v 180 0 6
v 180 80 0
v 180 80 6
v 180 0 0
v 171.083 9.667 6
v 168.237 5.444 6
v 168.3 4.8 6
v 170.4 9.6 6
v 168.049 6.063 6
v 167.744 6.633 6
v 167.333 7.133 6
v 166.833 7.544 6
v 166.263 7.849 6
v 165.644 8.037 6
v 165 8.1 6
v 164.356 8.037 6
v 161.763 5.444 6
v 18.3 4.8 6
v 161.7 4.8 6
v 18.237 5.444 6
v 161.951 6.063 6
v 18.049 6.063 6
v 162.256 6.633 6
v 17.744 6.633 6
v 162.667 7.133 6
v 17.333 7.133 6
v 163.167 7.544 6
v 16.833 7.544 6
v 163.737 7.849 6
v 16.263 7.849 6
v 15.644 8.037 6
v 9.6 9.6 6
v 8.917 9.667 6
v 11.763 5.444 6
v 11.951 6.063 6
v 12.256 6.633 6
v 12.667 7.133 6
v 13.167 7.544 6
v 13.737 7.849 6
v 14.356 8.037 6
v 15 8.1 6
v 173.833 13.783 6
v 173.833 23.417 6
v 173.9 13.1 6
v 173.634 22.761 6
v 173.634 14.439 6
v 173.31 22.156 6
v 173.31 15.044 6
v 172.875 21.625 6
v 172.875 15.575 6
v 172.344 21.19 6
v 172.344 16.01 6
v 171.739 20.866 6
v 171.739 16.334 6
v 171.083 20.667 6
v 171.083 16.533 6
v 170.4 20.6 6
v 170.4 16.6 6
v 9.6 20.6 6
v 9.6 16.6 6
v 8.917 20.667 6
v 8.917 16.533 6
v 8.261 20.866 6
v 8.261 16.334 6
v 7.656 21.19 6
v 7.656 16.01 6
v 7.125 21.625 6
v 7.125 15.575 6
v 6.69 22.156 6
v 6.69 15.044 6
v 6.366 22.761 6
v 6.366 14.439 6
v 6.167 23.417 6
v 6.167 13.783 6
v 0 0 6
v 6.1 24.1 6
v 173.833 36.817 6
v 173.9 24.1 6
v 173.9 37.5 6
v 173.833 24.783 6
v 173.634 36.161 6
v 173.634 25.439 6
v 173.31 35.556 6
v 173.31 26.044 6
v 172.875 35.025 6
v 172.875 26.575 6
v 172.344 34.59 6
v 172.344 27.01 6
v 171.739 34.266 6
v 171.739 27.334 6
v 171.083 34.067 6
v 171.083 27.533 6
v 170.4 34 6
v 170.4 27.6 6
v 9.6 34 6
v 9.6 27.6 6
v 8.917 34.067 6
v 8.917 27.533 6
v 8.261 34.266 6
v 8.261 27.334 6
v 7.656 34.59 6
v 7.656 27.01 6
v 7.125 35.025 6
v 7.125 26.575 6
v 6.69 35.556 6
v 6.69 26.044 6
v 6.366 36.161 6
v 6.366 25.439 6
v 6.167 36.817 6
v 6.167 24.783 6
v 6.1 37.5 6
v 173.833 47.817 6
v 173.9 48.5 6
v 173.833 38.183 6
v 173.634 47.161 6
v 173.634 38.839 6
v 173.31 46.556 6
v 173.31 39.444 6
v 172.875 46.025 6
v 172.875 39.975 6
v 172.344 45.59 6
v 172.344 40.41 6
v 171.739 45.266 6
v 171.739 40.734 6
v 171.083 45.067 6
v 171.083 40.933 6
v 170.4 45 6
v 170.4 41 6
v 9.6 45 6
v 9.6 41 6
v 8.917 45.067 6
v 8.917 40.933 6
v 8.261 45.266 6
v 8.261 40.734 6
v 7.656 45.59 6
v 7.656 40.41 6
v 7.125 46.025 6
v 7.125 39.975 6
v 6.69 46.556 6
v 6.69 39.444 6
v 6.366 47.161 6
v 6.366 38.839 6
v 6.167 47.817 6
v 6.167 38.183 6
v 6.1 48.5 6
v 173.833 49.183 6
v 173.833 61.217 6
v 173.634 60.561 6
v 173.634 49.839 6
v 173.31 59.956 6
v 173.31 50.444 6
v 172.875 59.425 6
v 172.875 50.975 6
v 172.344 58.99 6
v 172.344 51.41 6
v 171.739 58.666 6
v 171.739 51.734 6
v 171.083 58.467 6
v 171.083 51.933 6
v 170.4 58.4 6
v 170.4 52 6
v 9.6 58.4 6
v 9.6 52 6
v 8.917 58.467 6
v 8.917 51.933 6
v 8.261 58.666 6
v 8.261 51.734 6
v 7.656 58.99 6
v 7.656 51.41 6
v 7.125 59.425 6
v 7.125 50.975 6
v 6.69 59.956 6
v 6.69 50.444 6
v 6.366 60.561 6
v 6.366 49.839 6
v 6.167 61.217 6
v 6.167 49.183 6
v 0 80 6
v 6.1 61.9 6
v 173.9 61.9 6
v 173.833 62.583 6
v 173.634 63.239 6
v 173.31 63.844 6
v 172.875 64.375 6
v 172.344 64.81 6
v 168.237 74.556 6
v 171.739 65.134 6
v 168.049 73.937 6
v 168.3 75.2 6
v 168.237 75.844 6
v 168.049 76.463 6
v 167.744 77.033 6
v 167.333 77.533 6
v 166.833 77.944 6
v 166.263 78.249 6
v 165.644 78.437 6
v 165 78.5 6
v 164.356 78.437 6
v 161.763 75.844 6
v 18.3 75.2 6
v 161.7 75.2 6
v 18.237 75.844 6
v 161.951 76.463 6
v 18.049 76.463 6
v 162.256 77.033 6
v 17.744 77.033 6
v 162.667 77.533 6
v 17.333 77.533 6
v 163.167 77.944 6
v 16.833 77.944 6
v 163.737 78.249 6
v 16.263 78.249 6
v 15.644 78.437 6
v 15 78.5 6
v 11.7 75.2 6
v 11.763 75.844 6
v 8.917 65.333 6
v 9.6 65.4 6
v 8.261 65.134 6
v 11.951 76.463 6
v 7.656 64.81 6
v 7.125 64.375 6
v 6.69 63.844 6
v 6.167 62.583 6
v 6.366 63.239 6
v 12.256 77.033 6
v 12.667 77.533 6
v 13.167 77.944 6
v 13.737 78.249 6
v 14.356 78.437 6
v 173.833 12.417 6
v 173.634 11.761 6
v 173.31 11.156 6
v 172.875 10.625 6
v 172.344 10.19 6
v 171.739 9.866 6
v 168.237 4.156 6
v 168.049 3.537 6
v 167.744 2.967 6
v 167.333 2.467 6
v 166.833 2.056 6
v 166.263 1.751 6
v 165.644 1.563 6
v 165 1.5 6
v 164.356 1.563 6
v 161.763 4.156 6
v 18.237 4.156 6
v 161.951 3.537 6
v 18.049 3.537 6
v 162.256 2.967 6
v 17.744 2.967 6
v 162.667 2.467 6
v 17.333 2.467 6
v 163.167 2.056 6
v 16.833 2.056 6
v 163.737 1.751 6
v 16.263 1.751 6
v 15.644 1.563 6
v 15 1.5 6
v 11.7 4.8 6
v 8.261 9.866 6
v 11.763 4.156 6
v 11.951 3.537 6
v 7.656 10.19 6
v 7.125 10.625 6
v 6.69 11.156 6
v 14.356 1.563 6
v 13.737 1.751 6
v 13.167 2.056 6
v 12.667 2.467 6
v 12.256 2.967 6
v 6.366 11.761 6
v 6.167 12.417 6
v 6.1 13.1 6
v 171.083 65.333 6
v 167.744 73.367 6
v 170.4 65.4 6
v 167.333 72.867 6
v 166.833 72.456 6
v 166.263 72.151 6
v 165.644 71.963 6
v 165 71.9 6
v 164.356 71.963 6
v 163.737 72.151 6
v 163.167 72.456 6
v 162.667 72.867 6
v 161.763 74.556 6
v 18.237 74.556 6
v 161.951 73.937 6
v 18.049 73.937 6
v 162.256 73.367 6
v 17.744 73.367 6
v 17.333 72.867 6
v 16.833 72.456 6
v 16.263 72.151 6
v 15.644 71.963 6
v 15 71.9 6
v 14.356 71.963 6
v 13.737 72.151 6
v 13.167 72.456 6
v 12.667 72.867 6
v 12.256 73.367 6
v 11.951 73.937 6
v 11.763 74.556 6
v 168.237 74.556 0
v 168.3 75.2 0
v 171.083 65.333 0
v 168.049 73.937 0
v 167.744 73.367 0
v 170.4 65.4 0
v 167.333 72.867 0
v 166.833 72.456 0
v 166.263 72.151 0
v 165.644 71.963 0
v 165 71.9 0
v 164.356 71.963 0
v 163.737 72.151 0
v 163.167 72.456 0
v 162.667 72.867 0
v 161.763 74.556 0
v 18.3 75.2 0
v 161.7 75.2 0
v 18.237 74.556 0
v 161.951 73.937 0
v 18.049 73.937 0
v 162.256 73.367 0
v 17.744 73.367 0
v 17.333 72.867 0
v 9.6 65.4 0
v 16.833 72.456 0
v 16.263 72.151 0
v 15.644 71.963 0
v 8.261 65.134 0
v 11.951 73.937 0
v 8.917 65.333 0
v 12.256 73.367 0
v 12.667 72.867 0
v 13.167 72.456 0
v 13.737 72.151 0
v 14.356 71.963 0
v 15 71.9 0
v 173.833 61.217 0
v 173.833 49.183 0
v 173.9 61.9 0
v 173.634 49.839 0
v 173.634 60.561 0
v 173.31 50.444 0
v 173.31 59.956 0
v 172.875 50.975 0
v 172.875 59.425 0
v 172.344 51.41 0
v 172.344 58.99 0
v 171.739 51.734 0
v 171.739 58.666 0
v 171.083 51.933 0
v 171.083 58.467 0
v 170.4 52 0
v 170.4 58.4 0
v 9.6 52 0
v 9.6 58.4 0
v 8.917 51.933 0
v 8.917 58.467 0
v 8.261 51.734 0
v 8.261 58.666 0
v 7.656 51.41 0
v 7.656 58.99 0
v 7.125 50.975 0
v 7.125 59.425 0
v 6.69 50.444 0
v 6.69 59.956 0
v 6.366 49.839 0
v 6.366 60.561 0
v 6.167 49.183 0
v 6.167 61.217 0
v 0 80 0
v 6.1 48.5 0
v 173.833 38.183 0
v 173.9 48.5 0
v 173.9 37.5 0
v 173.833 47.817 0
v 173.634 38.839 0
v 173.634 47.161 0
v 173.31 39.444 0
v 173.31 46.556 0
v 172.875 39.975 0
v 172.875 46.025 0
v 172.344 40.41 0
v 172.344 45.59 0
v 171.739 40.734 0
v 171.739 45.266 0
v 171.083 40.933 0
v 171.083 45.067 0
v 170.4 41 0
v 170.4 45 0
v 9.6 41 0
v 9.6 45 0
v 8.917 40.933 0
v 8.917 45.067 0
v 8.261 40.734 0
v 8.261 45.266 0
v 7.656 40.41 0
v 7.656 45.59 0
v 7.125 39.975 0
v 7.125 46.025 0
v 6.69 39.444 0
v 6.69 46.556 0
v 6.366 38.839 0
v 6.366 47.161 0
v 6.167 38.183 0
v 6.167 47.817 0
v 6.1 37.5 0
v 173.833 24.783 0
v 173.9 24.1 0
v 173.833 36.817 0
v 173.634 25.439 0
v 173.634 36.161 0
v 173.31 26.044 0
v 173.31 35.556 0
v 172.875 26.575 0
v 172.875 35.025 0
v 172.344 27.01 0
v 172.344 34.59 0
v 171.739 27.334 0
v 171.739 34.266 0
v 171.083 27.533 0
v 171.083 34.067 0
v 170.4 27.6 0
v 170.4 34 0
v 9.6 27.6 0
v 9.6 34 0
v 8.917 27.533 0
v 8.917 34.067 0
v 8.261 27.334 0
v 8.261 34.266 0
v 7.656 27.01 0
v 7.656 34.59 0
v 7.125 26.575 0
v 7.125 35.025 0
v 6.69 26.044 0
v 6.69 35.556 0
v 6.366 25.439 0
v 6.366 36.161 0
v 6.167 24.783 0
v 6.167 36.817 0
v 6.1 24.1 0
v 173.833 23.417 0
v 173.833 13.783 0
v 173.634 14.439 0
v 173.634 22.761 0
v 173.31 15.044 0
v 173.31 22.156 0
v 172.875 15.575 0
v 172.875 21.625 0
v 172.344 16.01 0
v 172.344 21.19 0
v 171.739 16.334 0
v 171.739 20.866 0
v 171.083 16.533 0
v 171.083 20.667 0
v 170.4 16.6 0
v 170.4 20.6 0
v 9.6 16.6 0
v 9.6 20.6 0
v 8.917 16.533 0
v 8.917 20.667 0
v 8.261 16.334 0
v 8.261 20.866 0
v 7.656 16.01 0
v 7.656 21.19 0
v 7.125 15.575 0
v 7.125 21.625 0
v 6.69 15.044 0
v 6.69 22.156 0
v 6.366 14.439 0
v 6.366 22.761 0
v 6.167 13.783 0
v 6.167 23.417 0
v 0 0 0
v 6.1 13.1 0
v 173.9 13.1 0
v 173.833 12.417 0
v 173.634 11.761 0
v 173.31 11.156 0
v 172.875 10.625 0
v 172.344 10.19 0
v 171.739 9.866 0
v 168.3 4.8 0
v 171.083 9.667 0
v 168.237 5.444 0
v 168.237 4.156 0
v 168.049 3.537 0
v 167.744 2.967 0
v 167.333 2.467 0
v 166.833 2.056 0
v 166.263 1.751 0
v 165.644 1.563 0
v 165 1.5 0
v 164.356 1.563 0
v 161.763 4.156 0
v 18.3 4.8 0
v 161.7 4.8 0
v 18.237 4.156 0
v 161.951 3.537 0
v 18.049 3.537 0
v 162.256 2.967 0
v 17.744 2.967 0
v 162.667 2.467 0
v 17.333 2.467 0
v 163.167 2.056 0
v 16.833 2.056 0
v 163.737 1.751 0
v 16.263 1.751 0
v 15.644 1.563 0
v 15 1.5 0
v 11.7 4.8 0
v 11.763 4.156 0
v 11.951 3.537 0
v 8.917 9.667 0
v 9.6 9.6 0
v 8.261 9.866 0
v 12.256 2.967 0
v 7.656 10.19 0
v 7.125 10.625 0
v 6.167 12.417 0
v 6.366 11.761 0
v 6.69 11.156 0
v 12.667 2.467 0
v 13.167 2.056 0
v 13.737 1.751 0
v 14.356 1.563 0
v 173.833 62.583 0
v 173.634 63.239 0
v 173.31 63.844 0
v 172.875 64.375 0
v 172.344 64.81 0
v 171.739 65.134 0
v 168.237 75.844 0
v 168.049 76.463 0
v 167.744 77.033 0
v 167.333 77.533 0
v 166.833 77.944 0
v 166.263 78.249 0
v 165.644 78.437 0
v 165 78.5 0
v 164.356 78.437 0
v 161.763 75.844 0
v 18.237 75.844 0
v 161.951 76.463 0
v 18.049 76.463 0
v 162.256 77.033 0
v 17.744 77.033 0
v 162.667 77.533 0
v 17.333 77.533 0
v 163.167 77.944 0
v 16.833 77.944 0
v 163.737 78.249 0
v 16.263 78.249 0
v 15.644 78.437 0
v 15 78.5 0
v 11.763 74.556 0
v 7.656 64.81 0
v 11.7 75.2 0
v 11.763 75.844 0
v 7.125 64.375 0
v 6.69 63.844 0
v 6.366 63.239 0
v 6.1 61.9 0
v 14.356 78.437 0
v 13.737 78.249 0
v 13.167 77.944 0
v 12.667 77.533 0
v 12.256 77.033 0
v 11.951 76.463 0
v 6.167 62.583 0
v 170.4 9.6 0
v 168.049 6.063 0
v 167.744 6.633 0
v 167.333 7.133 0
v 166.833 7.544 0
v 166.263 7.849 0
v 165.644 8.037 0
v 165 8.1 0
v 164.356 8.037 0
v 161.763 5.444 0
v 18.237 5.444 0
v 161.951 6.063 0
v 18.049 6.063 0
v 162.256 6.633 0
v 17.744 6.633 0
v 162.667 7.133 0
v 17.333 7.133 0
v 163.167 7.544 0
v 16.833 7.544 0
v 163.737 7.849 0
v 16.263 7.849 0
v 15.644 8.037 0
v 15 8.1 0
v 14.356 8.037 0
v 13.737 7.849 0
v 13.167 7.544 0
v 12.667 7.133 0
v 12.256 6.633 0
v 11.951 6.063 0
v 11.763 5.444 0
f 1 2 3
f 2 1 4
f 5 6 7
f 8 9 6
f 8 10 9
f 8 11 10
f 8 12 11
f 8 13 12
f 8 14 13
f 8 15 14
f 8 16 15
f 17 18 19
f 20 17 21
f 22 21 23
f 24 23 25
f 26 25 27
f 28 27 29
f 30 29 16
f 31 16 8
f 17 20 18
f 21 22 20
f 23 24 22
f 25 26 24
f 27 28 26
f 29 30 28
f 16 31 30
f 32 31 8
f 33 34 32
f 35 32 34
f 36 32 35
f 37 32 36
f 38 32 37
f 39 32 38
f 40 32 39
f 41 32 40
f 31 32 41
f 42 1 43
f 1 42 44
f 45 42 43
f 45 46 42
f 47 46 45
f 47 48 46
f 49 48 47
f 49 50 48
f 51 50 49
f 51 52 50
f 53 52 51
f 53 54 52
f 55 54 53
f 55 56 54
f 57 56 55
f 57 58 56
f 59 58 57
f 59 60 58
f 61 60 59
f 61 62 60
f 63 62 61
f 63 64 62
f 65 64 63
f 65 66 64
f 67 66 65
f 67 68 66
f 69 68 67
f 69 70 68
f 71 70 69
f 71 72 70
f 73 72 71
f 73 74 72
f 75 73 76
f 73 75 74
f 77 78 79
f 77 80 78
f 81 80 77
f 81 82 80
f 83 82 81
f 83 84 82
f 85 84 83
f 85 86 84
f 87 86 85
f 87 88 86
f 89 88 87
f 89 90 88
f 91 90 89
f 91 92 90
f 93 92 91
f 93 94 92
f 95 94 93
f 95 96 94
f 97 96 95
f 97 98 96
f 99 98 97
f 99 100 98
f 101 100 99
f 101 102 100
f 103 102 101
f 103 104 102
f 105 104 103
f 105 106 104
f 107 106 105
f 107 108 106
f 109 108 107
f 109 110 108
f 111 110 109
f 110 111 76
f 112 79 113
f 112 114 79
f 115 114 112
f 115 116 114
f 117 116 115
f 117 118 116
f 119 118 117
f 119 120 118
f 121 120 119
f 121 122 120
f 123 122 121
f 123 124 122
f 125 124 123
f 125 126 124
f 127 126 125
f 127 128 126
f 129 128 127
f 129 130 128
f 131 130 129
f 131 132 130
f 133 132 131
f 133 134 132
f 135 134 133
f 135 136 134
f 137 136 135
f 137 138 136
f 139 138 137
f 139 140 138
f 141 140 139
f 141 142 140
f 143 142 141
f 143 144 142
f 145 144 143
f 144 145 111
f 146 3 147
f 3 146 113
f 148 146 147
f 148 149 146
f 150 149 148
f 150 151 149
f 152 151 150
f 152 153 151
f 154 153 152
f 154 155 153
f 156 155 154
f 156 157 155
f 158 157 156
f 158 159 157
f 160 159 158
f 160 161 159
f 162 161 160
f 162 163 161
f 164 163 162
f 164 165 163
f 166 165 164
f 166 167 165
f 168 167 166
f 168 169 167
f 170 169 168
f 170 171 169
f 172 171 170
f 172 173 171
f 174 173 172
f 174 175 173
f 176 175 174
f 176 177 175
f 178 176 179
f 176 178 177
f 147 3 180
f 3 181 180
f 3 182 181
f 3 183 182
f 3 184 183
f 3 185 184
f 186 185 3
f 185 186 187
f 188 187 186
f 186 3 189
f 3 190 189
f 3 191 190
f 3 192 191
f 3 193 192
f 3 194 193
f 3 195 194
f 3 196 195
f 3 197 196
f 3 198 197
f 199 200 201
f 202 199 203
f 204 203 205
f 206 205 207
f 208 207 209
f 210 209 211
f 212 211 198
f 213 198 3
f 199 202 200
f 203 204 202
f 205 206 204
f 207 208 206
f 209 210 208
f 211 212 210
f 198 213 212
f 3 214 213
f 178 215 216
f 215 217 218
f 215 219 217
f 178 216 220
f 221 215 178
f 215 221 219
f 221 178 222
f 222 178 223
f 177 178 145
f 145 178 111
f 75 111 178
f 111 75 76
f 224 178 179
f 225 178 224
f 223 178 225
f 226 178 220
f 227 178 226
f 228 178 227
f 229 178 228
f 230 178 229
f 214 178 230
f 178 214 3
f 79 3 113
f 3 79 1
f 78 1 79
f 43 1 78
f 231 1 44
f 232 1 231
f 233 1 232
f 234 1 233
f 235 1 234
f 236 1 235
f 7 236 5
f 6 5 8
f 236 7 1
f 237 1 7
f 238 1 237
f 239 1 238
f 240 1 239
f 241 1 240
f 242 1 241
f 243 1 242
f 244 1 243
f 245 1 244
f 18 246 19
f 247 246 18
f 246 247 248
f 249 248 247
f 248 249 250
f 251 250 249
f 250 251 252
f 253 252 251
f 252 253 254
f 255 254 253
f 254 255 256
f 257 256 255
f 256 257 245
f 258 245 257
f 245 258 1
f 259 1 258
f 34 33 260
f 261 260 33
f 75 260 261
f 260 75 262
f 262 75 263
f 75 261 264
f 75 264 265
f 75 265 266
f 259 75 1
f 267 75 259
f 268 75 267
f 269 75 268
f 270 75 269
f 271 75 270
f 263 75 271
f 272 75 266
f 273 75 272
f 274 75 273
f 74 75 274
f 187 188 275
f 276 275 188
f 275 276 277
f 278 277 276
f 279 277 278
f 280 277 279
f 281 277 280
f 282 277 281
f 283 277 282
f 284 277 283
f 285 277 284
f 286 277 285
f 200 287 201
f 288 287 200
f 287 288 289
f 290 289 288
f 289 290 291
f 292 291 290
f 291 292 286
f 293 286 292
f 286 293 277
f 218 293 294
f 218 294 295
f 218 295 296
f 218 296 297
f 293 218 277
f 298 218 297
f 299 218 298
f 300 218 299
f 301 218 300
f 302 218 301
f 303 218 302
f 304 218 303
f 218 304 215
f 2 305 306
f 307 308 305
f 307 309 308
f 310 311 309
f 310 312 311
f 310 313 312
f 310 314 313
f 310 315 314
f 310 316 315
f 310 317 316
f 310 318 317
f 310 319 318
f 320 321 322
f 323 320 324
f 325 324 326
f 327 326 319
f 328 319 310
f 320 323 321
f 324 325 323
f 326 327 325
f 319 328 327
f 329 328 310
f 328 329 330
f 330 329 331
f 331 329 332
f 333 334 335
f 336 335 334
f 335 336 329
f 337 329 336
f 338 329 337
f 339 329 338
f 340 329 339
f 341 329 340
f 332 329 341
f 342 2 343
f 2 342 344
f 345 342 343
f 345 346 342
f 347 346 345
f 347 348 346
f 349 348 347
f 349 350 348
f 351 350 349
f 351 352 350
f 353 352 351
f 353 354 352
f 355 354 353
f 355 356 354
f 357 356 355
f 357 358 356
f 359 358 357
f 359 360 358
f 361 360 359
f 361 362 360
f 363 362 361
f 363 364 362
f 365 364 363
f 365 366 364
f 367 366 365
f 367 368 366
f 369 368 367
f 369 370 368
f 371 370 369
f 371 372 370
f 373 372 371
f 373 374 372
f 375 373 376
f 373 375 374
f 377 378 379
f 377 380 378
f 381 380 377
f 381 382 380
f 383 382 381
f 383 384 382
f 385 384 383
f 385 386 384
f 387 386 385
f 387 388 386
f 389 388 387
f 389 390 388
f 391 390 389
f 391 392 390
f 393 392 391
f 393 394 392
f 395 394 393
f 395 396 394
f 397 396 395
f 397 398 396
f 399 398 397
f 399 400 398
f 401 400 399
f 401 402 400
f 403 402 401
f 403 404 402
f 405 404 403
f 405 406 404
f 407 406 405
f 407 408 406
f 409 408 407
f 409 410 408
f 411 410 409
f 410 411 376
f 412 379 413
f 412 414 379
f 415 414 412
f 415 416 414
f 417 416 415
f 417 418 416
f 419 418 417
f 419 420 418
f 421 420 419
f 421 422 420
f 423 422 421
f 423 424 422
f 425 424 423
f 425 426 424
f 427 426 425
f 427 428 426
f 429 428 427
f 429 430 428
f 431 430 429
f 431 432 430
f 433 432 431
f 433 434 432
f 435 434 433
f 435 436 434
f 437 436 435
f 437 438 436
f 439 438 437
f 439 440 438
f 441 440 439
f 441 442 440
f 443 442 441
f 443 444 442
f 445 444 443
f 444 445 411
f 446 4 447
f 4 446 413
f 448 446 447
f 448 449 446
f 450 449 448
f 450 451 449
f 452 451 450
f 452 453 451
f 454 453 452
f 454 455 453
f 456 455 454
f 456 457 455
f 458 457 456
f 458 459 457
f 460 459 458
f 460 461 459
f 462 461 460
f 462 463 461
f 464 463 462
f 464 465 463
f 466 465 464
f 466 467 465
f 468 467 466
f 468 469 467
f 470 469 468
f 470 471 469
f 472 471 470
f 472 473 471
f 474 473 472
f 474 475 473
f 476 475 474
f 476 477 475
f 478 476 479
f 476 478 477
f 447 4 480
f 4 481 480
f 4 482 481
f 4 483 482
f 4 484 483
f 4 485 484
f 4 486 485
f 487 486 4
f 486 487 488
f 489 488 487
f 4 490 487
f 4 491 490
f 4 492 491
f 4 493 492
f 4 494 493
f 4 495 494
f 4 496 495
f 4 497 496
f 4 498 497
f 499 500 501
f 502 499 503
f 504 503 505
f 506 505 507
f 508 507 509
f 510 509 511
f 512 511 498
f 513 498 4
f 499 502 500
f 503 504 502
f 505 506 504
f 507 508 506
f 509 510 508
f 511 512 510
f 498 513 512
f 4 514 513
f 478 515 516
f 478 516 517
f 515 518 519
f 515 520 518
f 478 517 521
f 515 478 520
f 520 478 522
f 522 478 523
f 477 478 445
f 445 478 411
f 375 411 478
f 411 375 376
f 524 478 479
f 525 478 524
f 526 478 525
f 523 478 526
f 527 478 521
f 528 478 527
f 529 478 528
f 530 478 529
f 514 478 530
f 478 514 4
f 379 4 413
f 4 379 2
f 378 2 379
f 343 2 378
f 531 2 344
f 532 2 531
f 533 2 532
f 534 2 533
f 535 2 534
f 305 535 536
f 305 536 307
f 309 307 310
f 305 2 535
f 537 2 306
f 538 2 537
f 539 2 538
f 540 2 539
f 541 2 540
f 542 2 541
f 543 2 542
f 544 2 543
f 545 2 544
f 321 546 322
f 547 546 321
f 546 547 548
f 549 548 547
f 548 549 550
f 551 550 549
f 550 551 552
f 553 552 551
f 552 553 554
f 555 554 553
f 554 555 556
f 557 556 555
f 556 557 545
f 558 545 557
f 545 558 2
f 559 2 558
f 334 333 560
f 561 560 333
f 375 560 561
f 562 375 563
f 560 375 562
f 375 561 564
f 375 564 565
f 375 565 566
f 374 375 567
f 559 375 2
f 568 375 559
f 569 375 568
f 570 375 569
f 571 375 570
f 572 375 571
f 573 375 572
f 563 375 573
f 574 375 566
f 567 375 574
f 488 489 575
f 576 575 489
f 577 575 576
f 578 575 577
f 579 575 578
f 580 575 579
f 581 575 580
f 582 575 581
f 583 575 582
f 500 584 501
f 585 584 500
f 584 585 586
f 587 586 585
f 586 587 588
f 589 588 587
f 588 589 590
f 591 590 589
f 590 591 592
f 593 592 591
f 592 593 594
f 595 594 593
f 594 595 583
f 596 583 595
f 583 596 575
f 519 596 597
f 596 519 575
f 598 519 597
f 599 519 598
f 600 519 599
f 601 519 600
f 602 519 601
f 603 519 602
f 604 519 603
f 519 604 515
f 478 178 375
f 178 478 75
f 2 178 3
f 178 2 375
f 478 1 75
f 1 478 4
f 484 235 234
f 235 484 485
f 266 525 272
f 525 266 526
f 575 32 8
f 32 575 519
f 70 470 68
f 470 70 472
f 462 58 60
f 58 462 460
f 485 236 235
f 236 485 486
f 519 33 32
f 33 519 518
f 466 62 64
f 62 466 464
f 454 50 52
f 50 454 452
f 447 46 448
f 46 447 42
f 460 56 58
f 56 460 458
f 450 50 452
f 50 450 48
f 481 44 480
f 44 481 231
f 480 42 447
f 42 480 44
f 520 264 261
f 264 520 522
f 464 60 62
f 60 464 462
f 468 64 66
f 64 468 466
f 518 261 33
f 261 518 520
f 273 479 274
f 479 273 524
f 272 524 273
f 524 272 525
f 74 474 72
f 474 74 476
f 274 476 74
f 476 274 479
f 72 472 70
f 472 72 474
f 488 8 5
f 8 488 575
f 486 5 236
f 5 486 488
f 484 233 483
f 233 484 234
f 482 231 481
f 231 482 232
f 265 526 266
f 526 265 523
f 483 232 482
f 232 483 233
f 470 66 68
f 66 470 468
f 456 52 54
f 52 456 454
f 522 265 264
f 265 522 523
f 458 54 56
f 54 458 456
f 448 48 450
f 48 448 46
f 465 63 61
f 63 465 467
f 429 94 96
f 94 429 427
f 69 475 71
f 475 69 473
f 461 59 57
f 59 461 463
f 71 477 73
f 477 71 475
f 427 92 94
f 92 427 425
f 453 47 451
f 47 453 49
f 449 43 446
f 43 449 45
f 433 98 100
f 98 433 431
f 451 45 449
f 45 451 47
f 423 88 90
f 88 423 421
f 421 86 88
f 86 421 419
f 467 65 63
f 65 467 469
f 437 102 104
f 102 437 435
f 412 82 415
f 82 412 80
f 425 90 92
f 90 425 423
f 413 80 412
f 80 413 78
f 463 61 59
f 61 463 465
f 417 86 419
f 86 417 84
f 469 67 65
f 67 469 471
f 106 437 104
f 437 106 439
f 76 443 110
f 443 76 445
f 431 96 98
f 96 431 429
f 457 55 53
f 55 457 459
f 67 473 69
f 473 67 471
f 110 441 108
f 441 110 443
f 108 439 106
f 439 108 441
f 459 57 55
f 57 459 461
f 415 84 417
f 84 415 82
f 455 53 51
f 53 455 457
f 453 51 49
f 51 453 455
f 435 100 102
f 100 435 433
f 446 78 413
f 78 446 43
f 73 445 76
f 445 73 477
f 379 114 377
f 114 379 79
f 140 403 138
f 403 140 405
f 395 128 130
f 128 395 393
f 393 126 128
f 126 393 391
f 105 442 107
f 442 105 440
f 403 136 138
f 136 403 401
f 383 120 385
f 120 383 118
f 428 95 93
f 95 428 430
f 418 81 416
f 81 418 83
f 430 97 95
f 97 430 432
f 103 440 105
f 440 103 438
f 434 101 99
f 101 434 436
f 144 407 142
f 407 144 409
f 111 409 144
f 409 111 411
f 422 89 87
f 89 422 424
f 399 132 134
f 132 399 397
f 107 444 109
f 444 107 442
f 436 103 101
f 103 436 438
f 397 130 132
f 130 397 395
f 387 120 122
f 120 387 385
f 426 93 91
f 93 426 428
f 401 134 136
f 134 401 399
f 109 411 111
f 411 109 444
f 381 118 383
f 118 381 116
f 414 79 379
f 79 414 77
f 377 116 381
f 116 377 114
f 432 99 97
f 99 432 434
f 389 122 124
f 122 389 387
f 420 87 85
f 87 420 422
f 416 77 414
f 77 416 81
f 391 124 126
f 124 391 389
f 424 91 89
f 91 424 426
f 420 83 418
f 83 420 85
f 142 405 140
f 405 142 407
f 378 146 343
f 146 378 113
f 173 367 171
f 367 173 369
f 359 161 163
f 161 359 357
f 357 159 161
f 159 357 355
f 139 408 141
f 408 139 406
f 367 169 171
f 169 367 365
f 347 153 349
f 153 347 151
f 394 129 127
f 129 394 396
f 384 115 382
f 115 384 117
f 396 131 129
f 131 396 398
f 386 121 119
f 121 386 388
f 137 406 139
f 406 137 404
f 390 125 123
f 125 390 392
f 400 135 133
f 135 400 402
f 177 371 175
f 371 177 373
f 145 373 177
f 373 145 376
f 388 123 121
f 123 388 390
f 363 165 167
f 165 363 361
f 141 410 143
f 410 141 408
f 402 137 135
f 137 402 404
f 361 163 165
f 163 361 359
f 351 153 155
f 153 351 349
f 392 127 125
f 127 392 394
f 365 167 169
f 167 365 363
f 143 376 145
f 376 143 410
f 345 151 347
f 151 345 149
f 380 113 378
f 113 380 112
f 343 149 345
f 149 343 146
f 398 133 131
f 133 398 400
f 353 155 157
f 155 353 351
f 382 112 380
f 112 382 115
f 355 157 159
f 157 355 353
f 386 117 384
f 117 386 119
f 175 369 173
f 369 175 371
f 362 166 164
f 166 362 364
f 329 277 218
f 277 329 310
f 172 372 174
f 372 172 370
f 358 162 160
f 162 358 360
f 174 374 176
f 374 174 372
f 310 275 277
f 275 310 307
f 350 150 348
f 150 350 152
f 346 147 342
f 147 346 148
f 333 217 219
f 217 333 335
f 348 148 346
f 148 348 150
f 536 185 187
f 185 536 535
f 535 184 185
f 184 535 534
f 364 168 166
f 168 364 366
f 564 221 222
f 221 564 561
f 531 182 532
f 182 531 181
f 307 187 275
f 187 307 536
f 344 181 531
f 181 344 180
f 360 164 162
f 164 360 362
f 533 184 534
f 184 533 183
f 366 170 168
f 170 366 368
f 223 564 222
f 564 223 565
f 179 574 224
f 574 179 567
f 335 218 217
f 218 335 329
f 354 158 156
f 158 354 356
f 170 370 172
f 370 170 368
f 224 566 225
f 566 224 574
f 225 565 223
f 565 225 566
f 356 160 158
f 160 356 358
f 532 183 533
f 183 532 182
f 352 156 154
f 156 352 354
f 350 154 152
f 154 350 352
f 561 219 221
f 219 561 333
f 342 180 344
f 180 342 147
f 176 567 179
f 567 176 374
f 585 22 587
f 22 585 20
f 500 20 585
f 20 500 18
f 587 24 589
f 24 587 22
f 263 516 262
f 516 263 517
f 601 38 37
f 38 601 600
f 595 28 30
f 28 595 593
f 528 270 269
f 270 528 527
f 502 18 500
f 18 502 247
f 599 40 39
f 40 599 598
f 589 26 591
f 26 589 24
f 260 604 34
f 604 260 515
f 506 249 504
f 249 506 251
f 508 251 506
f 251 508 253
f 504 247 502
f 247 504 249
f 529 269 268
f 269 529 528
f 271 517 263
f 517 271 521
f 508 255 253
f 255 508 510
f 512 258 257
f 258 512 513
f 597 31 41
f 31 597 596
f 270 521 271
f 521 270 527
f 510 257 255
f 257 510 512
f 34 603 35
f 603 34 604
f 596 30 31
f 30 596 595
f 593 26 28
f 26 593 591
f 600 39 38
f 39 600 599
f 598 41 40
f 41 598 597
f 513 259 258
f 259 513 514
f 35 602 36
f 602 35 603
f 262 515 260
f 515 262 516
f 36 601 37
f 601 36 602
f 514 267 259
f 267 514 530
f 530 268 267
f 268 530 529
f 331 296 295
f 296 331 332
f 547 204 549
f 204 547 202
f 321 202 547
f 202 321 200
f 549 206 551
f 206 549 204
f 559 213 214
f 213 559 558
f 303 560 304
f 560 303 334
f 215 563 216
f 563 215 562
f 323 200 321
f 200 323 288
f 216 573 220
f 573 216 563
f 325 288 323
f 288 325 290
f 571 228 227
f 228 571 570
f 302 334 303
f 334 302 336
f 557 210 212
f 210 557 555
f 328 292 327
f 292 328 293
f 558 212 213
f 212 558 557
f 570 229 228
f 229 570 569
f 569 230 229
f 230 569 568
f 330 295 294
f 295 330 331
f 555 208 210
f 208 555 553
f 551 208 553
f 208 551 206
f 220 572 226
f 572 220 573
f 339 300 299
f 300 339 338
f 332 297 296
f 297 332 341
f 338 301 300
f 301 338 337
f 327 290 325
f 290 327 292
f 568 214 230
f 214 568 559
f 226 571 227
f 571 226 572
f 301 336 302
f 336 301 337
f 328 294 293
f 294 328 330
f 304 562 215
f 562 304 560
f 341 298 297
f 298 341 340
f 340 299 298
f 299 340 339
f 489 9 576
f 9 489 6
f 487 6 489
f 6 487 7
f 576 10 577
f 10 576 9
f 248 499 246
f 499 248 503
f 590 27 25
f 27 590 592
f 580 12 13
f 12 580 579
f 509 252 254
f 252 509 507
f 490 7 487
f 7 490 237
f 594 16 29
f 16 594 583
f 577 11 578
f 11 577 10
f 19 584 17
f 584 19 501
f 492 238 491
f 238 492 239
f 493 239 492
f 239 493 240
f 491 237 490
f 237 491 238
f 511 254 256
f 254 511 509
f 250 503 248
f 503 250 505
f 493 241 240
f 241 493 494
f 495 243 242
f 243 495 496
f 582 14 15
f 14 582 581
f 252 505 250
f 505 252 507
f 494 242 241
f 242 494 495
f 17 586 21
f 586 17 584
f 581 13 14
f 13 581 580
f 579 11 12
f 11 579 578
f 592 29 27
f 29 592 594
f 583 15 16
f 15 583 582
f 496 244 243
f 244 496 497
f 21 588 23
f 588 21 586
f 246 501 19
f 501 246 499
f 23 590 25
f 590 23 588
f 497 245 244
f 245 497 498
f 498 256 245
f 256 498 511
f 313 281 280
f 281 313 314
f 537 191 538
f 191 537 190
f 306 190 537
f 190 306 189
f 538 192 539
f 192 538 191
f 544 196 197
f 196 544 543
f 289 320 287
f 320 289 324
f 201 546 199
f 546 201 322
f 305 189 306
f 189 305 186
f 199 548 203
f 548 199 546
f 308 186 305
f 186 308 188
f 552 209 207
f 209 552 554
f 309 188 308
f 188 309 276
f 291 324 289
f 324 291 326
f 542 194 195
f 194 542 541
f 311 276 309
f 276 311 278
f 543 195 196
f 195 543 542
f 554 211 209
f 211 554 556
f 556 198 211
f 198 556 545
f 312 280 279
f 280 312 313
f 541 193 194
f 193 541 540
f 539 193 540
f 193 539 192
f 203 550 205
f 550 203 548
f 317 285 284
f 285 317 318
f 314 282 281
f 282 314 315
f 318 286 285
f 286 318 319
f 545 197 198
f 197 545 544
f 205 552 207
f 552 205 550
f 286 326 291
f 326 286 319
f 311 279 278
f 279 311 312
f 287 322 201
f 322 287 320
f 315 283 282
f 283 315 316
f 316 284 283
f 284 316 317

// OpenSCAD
$fn = 32;

// ----------------------------------------------------------------------
// Slotted panel: 180 x 80 mm, 5 рядов of slots
// ----------------------------------------------------------------------

// --- parameters (mm) ---
panel_w = 180;            // panel width
panel_d = 80;             // panel depth
thick = 6;                // panel thickness
slot_w = 7;               // slot width
pitch0 = 11;              // first row pitch
pitch_step = 2.4;         // pitch increase per row
margin = 9.6;             // margin around the slot field
rows = 5;                 // number of slot rows
mount_d = 6.6;            // mounting holes
mount_x = 75;             // mounting hole offset

difference() {
  union() {
    cube([panel_w, panel_d, thick]);
  }
  /* slot rows: stadium shaped cutters, 2.5 mm clear of both faces */
  /* row 0: pitch 11, length 160.8 */
  hull() {
    translate([9.6, 13.1, -2.5]) cylinder(h = thick + 5, d = slot_w);
    translate([170.4, 13.1, -2.5]) cylinder(h = thick + 5, d = slot_w);
  }
  /* row 1: pitch 13.4, length 160.8 */
  hull() {
    translate([9.6, 24.1, -2.5]) cylinder(h = thick + 5, d = slot_w);
    translate([170.4, 24.1, -2.5]) cylinder(h = thick + 5, d = slot_w);
  }
  /* row 2: pitch 11, length 160.8 */
  hull() {
    translate([9.6, 37.5, -2.5]) cylinder(h = thick + 5, d = slot_w);
    translate([170.4, 37.5, -2.5]) cylinder(h = thick + 5, d = slot_w);
  }
  /* row 3: pitch 13.4, length 160.8 */
  hull() {
    translate([9.6, 48.5, -2.5]) cylinder(h = thick + 5, d = slot_w);
    translate([170.4, 48.5, -2.5]) cylinder(h = thick + 5, d = slot_w);
  }
  /* row 4: pitch 11, length 160.8 */
  hull() {
    translate([9.6, 61.9, -2.5]) cylinder(h = thick + 5, d = slot_w);
    translate([170.4, 61.9, -2.5]) cylinder(h = thick + 5, d = slot_w);
  }
  translate([15, 4.8, -2.5]) cylinder(h = 11, d = mount_d);
  translate([15, 75.2, -2.5]) cylinder(h = 11, d = mount_d);
  translate([165, 4.8, -2.5]) cylinder(h = 11, d = mount_d);
  translate([165, 75.2, -2.5]) cylinder(h = 11, d = mount_d);
}
